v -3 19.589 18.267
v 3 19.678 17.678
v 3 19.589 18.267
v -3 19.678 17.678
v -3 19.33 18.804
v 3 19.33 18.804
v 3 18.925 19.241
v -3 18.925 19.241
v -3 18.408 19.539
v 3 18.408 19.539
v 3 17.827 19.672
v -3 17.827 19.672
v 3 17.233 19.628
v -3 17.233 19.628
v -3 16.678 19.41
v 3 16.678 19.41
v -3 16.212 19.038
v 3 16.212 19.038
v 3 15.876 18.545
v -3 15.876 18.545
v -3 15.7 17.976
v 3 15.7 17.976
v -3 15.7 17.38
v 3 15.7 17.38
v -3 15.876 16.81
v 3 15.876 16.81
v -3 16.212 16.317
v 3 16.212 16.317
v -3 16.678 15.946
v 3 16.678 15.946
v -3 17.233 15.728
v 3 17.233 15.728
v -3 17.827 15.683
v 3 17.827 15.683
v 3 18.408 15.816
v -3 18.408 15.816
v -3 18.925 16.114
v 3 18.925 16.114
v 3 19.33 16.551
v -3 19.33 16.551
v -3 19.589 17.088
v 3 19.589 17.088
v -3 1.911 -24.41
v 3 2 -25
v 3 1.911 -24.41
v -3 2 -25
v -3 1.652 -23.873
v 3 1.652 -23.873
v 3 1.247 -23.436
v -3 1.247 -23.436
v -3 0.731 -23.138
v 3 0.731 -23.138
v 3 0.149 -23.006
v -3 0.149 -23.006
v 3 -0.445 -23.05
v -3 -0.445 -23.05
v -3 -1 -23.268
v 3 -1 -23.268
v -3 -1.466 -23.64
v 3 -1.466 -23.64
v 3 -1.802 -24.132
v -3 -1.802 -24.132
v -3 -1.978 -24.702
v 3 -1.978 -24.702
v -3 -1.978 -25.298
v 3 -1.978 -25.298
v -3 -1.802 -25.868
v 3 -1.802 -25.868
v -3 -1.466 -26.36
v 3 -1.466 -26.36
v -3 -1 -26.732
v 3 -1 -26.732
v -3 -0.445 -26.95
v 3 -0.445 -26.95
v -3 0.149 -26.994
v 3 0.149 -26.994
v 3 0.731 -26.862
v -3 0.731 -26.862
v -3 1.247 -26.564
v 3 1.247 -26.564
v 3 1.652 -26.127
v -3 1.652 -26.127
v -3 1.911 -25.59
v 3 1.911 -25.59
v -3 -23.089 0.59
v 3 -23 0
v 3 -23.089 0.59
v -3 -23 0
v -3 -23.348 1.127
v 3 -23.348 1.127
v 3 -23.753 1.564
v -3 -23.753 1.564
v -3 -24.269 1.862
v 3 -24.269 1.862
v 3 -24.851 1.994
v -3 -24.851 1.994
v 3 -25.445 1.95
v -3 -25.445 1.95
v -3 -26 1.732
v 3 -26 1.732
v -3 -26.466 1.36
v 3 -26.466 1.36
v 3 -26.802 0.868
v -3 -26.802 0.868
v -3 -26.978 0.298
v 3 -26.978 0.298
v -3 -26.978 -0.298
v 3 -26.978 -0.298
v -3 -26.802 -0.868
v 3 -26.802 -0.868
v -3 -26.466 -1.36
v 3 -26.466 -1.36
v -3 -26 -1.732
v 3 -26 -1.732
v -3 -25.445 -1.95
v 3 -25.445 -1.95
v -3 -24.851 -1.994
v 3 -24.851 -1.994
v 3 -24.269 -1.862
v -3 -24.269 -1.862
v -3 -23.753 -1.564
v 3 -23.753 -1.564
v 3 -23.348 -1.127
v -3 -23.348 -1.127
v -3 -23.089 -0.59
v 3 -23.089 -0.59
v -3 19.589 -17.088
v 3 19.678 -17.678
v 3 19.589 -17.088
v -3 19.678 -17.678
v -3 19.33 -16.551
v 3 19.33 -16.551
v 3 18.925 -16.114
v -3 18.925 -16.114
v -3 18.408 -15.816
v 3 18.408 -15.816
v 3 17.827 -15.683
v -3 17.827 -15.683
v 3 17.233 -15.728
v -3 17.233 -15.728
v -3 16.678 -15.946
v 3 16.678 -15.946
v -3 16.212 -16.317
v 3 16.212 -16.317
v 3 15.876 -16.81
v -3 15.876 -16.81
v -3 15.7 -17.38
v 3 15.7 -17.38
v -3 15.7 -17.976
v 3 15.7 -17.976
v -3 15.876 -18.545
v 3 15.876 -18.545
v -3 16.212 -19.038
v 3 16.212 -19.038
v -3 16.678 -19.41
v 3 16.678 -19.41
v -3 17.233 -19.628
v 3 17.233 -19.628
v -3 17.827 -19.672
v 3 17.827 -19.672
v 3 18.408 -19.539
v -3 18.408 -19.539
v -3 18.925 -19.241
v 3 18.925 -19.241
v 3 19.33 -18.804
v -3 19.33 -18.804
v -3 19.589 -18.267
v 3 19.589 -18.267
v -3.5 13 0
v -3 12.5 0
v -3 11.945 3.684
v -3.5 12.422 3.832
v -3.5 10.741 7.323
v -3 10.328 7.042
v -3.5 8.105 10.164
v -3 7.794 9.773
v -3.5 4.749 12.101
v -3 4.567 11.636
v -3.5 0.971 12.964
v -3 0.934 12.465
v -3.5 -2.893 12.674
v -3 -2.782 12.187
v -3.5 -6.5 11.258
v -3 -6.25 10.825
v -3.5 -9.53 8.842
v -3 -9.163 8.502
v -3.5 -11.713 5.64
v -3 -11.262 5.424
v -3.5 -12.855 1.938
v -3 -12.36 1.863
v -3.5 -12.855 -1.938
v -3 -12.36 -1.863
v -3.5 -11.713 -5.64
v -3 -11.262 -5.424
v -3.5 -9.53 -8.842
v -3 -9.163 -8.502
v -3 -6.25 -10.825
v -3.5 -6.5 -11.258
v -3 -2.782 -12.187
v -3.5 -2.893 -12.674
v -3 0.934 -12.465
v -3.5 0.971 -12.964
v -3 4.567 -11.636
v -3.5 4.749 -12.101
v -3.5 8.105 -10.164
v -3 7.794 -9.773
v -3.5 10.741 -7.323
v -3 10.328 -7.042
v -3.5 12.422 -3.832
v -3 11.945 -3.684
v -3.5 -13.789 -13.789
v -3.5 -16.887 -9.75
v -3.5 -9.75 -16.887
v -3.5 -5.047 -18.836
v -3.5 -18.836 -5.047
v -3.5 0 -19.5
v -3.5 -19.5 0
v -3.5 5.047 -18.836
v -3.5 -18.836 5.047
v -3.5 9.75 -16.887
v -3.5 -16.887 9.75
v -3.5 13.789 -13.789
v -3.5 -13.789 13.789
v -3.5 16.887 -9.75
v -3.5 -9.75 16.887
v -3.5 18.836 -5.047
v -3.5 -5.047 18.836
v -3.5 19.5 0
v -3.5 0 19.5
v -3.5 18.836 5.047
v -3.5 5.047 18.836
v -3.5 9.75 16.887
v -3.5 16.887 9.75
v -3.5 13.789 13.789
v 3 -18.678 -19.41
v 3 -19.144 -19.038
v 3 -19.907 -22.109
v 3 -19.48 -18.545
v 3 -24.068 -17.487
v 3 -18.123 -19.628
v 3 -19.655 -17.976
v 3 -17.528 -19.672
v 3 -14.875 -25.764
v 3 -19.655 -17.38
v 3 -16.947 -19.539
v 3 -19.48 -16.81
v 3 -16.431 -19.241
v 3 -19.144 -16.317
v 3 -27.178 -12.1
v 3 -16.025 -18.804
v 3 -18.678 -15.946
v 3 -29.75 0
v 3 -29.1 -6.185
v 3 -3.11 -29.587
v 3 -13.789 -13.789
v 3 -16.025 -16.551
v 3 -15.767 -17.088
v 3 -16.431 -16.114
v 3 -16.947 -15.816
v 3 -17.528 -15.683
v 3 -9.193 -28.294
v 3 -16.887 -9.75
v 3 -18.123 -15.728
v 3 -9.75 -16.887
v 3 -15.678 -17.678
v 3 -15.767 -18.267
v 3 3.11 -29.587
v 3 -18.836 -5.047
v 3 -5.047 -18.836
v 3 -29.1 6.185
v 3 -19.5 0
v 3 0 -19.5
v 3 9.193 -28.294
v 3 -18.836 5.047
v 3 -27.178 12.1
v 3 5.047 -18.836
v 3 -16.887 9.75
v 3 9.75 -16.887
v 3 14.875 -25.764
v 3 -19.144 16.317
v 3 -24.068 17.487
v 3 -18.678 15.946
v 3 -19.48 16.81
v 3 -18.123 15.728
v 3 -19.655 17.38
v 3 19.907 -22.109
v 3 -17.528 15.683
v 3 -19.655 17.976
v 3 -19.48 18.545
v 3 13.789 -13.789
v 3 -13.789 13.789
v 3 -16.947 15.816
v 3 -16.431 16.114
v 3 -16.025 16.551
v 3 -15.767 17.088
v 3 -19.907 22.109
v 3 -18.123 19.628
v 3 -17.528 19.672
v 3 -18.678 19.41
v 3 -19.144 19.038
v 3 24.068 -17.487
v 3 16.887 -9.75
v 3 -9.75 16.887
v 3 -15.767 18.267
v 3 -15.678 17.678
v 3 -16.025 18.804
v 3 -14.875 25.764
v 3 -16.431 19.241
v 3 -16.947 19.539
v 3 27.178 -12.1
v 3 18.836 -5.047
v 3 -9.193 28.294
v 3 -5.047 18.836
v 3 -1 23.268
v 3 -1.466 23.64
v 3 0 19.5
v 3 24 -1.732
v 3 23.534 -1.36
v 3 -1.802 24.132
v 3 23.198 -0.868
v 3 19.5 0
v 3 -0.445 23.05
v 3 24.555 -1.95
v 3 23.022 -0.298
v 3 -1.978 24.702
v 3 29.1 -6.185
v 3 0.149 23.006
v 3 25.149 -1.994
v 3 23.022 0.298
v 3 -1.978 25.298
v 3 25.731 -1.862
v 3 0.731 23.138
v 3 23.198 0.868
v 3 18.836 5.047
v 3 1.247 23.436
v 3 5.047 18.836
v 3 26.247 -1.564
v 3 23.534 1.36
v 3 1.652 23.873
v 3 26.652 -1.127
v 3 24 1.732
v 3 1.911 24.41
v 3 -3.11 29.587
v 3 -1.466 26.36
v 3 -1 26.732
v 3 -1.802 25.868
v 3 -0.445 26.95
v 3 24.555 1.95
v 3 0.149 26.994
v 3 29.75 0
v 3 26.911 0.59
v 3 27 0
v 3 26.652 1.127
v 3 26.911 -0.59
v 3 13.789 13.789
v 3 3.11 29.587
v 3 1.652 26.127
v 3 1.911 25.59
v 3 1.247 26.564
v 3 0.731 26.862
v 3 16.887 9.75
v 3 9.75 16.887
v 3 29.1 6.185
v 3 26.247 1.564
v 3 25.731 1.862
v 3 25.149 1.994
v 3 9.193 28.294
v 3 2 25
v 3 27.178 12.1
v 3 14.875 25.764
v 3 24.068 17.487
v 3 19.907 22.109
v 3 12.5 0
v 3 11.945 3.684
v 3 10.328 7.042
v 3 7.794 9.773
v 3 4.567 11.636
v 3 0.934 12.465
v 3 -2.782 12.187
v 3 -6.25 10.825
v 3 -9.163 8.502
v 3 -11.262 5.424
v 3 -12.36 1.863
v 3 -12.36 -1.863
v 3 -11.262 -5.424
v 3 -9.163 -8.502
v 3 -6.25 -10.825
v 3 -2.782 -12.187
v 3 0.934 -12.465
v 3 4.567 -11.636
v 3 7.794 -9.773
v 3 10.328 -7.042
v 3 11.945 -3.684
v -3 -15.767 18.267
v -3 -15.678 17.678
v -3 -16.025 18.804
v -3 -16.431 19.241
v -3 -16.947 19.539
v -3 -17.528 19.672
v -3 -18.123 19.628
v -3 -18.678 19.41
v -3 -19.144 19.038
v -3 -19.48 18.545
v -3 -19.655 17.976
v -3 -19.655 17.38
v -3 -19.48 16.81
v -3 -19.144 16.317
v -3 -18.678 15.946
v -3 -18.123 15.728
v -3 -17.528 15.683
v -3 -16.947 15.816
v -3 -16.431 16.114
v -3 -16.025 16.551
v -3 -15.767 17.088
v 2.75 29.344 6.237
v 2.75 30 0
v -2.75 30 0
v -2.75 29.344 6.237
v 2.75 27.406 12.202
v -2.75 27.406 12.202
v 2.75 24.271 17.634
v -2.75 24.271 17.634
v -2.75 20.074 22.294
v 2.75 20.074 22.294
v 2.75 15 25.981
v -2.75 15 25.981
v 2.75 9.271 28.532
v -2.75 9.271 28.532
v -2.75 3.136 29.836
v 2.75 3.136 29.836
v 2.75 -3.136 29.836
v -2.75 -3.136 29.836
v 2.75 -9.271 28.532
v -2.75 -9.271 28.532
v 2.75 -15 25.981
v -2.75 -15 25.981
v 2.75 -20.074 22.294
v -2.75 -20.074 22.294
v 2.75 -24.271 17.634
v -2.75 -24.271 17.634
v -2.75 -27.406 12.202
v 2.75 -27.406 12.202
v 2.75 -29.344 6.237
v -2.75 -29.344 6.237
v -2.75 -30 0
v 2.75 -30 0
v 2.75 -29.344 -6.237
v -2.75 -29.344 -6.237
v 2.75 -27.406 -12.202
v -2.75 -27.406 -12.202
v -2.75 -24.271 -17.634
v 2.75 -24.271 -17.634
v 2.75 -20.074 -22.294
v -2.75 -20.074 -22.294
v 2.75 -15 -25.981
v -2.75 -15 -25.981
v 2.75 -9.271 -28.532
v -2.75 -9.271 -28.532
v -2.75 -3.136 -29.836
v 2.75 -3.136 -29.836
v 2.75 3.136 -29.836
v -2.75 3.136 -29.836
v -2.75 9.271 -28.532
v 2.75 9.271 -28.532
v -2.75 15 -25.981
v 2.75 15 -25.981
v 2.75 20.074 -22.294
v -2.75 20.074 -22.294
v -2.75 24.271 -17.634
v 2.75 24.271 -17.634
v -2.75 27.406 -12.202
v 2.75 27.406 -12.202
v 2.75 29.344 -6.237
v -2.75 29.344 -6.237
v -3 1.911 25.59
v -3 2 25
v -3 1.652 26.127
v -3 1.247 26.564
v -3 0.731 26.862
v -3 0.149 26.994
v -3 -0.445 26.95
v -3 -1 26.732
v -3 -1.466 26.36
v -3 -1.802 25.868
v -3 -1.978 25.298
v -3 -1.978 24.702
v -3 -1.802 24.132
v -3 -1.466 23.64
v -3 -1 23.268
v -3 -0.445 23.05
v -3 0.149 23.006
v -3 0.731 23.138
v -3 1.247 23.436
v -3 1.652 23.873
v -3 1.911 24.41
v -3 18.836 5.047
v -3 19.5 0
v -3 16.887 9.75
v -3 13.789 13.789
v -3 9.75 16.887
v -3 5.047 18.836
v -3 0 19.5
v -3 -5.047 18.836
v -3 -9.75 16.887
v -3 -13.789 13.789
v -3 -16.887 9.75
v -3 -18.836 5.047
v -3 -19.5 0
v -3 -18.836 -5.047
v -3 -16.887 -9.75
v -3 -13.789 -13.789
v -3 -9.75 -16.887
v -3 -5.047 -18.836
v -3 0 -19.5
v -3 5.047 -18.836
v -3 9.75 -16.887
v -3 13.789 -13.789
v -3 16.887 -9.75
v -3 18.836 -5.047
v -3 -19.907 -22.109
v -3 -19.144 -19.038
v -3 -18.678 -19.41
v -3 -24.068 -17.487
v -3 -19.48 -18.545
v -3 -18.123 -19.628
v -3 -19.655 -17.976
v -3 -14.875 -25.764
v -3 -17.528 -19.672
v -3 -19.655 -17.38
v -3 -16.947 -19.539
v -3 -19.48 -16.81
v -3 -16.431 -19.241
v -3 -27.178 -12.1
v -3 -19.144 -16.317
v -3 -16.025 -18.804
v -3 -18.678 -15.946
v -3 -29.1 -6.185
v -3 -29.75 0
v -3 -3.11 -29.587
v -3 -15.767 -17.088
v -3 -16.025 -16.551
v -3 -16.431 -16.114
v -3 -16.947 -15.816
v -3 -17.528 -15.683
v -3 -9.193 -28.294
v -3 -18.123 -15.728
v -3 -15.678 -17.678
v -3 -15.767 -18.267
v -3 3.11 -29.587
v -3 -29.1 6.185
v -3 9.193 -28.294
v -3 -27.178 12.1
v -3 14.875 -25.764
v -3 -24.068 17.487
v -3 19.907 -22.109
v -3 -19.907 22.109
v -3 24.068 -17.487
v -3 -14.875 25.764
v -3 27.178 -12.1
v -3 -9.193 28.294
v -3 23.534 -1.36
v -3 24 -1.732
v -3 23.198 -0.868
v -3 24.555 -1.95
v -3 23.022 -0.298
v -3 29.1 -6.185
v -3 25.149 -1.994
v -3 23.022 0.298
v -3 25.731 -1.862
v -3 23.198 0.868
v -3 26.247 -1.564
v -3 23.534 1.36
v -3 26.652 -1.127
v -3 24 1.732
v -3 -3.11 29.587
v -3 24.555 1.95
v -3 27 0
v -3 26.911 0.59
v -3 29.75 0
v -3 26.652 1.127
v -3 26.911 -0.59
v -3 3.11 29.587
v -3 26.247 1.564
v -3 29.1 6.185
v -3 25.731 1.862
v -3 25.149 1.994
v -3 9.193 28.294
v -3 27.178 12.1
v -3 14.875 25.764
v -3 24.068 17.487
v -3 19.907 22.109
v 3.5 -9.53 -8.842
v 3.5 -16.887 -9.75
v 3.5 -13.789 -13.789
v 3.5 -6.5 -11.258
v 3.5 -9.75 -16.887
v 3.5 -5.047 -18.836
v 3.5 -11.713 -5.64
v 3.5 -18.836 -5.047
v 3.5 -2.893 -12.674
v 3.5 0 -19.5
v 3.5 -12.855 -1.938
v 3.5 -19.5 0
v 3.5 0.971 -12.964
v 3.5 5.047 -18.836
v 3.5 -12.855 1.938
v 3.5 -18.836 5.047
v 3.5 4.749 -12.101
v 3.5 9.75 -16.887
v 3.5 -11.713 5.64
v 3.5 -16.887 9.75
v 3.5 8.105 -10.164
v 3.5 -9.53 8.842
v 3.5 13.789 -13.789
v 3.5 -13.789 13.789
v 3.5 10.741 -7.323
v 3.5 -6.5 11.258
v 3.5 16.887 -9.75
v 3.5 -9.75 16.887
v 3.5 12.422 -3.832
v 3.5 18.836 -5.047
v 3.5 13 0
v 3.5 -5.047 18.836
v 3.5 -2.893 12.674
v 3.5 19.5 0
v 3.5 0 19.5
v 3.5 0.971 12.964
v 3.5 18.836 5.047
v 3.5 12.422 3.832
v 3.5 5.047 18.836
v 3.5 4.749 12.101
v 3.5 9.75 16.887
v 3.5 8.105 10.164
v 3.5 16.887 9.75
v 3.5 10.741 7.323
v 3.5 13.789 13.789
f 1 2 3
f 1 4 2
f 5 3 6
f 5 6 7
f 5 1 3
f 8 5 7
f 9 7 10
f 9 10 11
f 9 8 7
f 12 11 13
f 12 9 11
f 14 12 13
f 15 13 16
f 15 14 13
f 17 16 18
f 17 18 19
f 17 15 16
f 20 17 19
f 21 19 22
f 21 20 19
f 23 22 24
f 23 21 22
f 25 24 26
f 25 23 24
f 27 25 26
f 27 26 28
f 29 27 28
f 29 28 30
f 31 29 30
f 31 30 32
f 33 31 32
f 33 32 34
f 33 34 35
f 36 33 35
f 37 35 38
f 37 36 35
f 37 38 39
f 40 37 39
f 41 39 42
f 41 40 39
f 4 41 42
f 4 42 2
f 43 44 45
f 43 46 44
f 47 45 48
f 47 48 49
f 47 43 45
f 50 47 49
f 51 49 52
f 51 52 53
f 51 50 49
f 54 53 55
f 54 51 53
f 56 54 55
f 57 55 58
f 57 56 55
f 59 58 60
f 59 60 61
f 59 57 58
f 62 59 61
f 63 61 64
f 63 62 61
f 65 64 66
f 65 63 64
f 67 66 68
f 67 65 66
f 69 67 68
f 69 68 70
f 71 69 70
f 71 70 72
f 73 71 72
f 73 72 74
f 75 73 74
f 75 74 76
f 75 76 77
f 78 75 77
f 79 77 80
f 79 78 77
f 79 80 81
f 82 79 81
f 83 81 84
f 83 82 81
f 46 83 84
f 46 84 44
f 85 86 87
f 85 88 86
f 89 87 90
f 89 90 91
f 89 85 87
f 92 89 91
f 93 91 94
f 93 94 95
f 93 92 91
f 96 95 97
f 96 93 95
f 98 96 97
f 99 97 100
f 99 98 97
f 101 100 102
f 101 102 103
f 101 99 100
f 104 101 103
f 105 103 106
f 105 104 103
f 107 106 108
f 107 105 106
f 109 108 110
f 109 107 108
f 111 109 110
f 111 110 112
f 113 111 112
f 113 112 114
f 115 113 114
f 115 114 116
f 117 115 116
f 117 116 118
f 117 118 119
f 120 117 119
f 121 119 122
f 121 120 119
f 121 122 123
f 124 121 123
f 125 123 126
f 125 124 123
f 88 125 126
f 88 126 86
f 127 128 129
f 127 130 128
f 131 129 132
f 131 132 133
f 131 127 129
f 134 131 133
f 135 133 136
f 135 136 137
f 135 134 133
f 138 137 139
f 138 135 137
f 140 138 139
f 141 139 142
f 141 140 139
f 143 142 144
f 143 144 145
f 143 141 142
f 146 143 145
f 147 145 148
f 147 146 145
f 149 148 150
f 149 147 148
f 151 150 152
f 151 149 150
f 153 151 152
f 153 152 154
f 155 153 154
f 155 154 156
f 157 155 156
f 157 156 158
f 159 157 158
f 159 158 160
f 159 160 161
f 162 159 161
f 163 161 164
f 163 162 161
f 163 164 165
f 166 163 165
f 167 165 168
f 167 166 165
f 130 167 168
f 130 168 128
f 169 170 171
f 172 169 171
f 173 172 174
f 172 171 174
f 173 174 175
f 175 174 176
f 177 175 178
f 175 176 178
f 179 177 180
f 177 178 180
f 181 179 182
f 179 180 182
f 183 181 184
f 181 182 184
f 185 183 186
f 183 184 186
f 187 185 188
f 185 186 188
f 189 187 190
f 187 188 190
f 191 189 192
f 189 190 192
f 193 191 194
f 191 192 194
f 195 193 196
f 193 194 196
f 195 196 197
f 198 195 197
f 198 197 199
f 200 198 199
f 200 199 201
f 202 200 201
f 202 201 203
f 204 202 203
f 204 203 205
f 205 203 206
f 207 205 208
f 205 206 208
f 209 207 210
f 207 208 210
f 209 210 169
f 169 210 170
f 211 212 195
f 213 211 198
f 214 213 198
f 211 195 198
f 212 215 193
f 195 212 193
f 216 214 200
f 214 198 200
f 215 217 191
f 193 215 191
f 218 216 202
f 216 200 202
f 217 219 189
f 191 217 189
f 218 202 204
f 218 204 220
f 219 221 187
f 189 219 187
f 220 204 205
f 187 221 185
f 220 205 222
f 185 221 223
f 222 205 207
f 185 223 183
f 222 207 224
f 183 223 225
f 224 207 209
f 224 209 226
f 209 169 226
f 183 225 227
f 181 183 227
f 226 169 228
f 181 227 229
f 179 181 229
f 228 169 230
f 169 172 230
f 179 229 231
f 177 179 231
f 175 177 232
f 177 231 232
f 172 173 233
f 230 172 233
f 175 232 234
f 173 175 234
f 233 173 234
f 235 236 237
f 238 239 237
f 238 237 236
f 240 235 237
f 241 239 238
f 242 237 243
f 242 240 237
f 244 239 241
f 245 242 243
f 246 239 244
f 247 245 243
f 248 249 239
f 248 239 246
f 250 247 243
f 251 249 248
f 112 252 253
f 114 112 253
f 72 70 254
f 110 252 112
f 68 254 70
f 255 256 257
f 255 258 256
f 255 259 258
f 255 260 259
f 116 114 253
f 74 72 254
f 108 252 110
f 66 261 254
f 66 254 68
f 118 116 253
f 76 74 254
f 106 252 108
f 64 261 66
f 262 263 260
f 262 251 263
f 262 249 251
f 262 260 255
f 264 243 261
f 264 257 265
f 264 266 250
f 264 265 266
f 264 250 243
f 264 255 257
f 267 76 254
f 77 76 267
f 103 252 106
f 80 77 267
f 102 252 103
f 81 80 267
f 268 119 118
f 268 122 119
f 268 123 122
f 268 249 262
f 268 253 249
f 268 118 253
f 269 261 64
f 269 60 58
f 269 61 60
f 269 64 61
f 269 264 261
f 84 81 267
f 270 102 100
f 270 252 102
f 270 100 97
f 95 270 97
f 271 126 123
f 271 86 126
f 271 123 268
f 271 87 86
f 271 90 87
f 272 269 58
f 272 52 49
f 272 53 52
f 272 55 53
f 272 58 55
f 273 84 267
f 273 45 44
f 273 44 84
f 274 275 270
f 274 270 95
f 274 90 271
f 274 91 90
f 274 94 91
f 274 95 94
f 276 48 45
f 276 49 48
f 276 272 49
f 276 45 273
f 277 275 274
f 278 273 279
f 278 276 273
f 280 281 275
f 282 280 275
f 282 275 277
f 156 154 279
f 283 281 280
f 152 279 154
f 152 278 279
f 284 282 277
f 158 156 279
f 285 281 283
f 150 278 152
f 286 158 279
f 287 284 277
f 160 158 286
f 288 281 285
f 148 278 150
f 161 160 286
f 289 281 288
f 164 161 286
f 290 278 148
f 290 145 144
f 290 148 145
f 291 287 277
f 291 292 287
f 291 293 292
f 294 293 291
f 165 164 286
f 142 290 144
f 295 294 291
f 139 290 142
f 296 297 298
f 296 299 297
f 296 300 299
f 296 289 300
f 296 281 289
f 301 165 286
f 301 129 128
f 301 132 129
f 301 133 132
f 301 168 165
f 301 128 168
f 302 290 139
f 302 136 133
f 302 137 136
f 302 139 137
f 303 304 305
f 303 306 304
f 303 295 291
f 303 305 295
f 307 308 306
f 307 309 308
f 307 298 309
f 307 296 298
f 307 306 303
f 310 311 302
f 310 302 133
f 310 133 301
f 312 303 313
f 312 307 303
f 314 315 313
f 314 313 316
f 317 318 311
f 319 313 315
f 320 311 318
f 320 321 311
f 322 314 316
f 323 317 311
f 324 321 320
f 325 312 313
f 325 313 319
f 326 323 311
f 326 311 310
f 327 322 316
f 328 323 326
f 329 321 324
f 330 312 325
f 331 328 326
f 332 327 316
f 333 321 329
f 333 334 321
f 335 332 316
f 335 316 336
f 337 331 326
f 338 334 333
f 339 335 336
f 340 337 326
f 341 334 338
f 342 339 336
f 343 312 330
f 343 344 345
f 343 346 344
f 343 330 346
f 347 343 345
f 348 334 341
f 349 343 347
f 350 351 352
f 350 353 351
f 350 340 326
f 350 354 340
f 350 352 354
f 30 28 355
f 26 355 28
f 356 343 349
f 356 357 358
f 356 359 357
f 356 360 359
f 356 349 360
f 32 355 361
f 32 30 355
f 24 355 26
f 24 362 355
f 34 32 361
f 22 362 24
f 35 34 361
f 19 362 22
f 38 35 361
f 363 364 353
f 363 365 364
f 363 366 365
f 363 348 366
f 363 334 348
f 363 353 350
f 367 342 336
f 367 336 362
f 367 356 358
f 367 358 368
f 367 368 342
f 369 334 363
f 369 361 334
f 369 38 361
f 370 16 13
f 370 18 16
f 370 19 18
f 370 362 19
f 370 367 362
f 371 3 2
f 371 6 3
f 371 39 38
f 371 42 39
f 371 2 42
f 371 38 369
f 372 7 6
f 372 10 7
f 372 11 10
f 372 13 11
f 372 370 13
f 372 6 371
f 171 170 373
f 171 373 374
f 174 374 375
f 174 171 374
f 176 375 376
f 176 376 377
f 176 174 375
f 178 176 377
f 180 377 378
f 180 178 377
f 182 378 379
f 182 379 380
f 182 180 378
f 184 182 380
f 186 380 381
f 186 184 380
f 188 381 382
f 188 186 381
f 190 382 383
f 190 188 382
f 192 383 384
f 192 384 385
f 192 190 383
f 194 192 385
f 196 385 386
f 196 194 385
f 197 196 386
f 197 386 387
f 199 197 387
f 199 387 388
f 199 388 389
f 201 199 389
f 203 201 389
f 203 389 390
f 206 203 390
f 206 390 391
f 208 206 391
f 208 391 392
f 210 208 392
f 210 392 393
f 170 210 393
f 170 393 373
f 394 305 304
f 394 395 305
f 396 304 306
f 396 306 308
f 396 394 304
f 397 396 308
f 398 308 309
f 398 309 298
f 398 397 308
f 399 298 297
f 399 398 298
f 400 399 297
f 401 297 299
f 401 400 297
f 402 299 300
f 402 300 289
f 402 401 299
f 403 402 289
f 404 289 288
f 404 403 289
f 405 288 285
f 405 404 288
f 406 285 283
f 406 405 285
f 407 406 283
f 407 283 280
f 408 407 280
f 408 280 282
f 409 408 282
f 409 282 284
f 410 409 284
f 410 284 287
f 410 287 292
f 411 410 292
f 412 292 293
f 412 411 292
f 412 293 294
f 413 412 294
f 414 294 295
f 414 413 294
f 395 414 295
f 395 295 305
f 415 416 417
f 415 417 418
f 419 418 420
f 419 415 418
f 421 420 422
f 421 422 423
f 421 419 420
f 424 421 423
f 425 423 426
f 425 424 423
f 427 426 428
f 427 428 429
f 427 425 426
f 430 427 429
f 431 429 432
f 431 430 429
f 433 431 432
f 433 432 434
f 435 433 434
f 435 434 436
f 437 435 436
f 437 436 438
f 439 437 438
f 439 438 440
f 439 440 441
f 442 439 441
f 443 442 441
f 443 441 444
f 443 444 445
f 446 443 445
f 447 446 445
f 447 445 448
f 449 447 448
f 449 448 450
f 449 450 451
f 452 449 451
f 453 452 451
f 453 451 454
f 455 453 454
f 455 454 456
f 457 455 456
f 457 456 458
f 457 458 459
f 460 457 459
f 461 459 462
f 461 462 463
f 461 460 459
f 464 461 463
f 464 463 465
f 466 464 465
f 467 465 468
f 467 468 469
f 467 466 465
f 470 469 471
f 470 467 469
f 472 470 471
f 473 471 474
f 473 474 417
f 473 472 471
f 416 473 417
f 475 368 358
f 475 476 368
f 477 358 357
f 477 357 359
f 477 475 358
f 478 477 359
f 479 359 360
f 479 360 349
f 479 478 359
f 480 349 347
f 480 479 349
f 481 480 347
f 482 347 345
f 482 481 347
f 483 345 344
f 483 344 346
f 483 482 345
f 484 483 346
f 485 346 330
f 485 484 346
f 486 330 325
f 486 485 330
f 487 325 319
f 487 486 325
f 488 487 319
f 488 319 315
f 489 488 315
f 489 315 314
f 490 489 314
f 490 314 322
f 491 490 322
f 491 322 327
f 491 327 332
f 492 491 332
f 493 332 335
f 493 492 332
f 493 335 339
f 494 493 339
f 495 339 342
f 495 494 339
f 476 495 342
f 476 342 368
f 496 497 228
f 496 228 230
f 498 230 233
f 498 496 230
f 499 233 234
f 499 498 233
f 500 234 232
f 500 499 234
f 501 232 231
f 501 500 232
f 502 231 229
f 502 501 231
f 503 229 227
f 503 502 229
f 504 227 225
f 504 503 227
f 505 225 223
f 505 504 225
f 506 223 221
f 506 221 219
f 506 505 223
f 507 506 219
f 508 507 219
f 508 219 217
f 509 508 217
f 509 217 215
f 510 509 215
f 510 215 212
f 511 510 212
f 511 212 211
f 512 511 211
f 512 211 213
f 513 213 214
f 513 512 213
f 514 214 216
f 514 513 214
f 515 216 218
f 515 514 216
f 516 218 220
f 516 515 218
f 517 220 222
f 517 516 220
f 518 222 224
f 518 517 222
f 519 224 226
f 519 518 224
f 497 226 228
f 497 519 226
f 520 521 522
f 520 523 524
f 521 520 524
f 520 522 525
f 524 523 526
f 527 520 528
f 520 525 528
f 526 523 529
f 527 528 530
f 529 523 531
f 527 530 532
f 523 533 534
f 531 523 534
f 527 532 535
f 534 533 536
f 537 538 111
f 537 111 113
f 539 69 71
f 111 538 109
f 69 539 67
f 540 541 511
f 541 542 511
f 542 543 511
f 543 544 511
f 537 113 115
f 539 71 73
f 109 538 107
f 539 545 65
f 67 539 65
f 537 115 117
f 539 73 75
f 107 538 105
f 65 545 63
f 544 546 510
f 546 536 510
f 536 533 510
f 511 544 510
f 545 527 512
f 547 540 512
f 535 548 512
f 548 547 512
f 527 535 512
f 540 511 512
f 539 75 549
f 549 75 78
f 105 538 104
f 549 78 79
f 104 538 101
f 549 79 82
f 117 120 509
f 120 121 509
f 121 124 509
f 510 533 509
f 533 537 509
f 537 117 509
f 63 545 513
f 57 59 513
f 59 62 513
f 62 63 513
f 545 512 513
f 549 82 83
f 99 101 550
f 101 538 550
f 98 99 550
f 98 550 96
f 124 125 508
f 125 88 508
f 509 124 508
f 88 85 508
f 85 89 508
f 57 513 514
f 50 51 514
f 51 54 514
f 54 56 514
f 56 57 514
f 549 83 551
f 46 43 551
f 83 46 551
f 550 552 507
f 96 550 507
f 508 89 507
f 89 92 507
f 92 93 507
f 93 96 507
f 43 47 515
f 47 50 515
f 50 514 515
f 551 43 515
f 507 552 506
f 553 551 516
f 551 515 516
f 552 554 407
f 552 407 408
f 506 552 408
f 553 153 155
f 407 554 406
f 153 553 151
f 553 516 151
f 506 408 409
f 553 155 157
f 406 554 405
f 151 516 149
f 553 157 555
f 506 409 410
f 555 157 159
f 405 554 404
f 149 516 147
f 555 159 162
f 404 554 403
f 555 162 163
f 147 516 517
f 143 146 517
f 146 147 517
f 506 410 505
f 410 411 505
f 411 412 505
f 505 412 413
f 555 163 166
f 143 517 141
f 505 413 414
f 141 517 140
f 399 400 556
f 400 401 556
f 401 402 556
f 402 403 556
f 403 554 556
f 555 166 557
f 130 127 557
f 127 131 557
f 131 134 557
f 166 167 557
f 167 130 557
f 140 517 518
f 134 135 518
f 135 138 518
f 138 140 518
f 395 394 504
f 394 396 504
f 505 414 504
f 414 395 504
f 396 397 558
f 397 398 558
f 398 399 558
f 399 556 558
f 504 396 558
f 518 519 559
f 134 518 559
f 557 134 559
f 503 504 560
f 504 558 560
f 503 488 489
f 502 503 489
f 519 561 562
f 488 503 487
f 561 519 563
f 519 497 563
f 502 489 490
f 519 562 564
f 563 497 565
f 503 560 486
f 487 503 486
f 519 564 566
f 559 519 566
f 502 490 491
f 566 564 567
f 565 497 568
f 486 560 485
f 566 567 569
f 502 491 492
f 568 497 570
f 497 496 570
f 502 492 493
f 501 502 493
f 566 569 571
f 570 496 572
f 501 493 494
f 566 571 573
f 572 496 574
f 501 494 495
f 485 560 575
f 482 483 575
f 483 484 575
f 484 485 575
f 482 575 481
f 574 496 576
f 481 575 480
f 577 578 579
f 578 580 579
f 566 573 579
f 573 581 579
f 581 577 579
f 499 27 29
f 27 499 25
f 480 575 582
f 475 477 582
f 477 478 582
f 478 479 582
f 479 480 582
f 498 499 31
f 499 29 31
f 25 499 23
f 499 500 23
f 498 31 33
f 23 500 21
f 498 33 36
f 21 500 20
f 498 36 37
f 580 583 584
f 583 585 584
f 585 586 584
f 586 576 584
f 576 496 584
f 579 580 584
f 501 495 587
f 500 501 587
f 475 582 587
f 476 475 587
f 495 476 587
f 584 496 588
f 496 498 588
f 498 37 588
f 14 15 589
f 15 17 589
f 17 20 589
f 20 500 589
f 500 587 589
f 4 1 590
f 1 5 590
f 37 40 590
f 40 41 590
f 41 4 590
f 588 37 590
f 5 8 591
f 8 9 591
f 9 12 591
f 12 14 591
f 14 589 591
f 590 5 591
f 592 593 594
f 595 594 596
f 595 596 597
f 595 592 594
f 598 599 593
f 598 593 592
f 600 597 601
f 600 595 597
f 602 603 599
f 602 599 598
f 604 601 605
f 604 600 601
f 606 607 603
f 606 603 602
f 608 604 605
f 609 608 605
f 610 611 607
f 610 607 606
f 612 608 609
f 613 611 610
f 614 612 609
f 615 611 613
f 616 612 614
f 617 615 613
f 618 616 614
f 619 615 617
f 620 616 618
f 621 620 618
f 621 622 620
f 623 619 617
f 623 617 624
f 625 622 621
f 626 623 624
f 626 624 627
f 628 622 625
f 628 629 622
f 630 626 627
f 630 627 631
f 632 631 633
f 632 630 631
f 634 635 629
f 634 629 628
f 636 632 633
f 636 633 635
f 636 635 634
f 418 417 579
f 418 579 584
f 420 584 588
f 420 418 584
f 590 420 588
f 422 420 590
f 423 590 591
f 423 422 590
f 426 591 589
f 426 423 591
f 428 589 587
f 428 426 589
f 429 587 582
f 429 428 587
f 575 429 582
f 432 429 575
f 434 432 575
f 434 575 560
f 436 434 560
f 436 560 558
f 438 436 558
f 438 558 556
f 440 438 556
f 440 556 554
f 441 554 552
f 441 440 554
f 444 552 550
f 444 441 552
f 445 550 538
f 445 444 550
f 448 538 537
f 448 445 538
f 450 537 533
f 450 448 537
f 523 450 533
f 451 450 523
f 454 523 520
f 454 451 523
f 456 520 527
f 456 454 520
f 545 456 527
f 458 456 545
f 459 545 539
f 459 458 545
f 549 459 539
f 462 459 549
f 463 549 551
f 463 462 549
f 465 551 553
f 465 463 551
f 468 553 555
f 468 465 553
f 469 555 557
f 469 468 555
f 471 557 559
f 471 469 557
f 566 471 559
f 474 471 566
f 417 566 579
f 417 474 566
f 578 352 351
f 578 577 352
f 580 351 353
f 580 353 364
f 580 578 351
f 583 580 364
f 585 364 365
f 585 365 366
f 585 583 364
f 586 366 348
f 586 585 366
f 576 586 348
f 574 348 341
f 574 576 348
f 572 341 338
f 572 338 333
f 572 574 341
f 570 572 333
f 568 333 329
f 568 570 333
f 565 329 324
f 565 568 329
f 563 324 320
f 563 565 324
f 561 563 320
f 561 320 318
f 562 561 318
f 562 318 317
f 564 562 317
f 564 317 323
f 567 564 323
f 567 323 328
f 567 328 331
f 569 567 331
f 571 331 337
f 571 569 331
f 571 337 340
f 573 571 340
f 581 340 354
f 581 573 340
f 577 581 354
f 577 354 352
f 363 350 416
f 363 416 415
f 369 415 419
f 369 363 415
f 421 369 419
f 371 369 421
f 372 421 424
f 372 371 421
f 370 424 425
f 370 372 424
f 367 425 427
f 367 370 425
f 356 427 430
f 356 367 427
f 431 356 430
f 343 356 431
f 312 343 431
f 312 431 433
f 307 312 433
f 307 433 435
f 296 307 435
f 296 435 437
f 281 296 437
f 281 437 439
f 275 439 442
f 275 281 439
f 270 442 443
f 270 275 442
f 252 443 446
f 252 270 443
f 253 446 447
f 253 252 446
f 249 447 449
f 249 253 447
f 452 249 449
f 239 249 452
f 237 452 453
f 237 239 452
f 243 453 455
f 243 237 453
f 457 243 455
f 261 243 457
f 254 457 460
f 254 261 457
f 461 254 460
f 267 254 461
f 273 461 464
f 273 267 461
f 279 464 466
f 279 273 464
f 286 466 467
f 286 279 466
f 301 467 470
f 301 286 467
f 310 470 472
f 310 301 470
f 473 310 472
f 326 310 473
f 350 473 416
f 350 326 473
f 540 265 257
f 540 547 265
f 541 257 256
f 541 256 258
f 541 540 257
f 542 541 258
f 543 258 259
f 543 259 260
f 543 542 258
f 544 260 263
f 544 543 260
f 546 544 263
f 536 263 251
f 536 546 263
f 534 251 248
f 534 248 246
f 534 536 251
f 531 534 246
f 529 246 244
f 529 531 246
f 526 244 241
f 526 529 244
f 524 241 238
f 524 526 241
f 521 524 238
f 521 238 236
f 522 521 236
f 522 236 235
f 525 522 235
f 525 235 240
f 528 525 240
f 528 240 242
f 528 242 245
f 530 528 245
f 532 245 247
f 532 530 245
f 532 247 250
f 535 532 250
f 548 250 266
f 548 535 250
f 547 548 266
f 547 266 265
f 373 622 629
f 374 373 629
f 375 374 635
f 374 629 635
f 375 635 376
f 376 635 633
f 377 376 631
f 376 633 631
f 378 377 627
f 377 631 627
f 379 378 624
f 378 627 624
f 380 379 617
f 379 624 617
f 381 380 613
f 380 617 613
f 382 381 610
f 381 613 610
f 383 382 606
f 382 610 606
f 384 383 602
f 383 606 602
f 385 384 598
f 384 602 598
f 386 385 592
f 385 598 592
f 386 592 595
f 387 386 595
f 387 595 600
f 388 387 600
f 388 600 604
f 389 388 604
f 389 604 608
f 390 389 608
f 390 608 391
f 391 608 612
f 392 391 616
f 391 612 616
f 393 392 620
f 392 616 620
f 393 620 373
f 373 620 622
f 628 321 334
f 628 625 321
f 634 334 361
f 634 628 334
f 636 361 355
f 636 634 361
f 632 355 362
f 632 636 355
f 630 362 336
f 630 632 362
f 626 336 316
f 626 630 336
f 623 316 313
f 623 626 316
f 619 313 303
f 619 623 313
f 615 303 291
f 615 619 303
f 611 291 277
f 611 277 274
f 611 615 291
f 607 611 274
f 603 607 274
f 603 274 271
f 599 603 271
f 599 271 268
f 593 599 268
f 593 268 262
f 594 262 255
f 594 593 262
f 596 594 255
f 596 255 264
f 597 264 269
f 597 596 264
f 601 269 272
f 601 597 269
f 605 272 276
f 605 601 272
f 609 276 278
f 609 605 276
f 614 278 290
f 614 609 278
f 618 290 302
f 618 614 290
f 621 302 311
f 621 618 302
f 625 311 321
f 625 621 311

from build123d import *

# Parameters (mm, degrees)
F0_R     = 30
F0_R_2   = 2
F0_R_3   = 19.5
F1_DEPTH = 3
F0_R_4   = 12.5
F2_DEPTH = 3.5
F3_SIZE  = 0.5
F4_SIZE  = 0.25


with BuildPart() as f1:
    # F0 (on Right) → F1 (new body, symmetric)
    with BuildSketch(Plane.YZ):
        Circle(F0_R)
        with Locations((-17.67767, -17.67767)):
            Circle(F0_R_2, mode=Mode.SUBTRACT)
        with Locations((0, -25)):
            Circle(F0_R_2, mode=Mode.SUBTRACT)
        with Locations((17.67767, -17.67767)):
            Circle(F0_R_2, mode=Mode.SUBTRACT)
        with Locations((-25, 0)):
            Circle(F0_R_2, mode=Mode.SUBTRACT)
        with Locations((-17.67767, 17.67767)):
            Circle(F0_R_2, mode=Mode.SUBTRACT)
        Circle(F0_R_3, mode=Mode.SUBTRACT)
        with Locations((25, 0)):
            Circle(F0_R_2, mode=Mode.SUBTRACT)
        with Locations((0, 25)):
            Circle(F0_R_2, mode=Mode.SUBTRACT)
        with Locations((17.67767, 17.67767)):
            Circle(F0_R_2, mode=Mode.SUBTRACT)
    extrude(amount=F1_DEPTH, both=True)

    # F0 (on Right) → F2 (join, symmetric)
    with BuildSketch(Plane.YZ):
        Circle(F0_R_3)
        Circle(F0_R_4, mode=Mode.SUBTRACT)
    extrude(amount=F2_DEPTH, both=True)

    # F3
    f3_edges = [f1.edges().sort_by_distance(p)[0] for p in [
        (3.5, -12.5, 0),
        (0, 12.5, 0),
        (-3.5, -12.5, 0),
    ]]
    chamfer(f3_edges, length=F3_SIZE)

    # F4
    f4_edges = [f1.edges().sort_by_distance(p)[0] for p in [
        (-3, -30, 0),
        (0, 30, 0),
        (3, -30, 0),
    ]]
    chamfer(f4_edges, length=F4_SIZE)


solid = f1.part
